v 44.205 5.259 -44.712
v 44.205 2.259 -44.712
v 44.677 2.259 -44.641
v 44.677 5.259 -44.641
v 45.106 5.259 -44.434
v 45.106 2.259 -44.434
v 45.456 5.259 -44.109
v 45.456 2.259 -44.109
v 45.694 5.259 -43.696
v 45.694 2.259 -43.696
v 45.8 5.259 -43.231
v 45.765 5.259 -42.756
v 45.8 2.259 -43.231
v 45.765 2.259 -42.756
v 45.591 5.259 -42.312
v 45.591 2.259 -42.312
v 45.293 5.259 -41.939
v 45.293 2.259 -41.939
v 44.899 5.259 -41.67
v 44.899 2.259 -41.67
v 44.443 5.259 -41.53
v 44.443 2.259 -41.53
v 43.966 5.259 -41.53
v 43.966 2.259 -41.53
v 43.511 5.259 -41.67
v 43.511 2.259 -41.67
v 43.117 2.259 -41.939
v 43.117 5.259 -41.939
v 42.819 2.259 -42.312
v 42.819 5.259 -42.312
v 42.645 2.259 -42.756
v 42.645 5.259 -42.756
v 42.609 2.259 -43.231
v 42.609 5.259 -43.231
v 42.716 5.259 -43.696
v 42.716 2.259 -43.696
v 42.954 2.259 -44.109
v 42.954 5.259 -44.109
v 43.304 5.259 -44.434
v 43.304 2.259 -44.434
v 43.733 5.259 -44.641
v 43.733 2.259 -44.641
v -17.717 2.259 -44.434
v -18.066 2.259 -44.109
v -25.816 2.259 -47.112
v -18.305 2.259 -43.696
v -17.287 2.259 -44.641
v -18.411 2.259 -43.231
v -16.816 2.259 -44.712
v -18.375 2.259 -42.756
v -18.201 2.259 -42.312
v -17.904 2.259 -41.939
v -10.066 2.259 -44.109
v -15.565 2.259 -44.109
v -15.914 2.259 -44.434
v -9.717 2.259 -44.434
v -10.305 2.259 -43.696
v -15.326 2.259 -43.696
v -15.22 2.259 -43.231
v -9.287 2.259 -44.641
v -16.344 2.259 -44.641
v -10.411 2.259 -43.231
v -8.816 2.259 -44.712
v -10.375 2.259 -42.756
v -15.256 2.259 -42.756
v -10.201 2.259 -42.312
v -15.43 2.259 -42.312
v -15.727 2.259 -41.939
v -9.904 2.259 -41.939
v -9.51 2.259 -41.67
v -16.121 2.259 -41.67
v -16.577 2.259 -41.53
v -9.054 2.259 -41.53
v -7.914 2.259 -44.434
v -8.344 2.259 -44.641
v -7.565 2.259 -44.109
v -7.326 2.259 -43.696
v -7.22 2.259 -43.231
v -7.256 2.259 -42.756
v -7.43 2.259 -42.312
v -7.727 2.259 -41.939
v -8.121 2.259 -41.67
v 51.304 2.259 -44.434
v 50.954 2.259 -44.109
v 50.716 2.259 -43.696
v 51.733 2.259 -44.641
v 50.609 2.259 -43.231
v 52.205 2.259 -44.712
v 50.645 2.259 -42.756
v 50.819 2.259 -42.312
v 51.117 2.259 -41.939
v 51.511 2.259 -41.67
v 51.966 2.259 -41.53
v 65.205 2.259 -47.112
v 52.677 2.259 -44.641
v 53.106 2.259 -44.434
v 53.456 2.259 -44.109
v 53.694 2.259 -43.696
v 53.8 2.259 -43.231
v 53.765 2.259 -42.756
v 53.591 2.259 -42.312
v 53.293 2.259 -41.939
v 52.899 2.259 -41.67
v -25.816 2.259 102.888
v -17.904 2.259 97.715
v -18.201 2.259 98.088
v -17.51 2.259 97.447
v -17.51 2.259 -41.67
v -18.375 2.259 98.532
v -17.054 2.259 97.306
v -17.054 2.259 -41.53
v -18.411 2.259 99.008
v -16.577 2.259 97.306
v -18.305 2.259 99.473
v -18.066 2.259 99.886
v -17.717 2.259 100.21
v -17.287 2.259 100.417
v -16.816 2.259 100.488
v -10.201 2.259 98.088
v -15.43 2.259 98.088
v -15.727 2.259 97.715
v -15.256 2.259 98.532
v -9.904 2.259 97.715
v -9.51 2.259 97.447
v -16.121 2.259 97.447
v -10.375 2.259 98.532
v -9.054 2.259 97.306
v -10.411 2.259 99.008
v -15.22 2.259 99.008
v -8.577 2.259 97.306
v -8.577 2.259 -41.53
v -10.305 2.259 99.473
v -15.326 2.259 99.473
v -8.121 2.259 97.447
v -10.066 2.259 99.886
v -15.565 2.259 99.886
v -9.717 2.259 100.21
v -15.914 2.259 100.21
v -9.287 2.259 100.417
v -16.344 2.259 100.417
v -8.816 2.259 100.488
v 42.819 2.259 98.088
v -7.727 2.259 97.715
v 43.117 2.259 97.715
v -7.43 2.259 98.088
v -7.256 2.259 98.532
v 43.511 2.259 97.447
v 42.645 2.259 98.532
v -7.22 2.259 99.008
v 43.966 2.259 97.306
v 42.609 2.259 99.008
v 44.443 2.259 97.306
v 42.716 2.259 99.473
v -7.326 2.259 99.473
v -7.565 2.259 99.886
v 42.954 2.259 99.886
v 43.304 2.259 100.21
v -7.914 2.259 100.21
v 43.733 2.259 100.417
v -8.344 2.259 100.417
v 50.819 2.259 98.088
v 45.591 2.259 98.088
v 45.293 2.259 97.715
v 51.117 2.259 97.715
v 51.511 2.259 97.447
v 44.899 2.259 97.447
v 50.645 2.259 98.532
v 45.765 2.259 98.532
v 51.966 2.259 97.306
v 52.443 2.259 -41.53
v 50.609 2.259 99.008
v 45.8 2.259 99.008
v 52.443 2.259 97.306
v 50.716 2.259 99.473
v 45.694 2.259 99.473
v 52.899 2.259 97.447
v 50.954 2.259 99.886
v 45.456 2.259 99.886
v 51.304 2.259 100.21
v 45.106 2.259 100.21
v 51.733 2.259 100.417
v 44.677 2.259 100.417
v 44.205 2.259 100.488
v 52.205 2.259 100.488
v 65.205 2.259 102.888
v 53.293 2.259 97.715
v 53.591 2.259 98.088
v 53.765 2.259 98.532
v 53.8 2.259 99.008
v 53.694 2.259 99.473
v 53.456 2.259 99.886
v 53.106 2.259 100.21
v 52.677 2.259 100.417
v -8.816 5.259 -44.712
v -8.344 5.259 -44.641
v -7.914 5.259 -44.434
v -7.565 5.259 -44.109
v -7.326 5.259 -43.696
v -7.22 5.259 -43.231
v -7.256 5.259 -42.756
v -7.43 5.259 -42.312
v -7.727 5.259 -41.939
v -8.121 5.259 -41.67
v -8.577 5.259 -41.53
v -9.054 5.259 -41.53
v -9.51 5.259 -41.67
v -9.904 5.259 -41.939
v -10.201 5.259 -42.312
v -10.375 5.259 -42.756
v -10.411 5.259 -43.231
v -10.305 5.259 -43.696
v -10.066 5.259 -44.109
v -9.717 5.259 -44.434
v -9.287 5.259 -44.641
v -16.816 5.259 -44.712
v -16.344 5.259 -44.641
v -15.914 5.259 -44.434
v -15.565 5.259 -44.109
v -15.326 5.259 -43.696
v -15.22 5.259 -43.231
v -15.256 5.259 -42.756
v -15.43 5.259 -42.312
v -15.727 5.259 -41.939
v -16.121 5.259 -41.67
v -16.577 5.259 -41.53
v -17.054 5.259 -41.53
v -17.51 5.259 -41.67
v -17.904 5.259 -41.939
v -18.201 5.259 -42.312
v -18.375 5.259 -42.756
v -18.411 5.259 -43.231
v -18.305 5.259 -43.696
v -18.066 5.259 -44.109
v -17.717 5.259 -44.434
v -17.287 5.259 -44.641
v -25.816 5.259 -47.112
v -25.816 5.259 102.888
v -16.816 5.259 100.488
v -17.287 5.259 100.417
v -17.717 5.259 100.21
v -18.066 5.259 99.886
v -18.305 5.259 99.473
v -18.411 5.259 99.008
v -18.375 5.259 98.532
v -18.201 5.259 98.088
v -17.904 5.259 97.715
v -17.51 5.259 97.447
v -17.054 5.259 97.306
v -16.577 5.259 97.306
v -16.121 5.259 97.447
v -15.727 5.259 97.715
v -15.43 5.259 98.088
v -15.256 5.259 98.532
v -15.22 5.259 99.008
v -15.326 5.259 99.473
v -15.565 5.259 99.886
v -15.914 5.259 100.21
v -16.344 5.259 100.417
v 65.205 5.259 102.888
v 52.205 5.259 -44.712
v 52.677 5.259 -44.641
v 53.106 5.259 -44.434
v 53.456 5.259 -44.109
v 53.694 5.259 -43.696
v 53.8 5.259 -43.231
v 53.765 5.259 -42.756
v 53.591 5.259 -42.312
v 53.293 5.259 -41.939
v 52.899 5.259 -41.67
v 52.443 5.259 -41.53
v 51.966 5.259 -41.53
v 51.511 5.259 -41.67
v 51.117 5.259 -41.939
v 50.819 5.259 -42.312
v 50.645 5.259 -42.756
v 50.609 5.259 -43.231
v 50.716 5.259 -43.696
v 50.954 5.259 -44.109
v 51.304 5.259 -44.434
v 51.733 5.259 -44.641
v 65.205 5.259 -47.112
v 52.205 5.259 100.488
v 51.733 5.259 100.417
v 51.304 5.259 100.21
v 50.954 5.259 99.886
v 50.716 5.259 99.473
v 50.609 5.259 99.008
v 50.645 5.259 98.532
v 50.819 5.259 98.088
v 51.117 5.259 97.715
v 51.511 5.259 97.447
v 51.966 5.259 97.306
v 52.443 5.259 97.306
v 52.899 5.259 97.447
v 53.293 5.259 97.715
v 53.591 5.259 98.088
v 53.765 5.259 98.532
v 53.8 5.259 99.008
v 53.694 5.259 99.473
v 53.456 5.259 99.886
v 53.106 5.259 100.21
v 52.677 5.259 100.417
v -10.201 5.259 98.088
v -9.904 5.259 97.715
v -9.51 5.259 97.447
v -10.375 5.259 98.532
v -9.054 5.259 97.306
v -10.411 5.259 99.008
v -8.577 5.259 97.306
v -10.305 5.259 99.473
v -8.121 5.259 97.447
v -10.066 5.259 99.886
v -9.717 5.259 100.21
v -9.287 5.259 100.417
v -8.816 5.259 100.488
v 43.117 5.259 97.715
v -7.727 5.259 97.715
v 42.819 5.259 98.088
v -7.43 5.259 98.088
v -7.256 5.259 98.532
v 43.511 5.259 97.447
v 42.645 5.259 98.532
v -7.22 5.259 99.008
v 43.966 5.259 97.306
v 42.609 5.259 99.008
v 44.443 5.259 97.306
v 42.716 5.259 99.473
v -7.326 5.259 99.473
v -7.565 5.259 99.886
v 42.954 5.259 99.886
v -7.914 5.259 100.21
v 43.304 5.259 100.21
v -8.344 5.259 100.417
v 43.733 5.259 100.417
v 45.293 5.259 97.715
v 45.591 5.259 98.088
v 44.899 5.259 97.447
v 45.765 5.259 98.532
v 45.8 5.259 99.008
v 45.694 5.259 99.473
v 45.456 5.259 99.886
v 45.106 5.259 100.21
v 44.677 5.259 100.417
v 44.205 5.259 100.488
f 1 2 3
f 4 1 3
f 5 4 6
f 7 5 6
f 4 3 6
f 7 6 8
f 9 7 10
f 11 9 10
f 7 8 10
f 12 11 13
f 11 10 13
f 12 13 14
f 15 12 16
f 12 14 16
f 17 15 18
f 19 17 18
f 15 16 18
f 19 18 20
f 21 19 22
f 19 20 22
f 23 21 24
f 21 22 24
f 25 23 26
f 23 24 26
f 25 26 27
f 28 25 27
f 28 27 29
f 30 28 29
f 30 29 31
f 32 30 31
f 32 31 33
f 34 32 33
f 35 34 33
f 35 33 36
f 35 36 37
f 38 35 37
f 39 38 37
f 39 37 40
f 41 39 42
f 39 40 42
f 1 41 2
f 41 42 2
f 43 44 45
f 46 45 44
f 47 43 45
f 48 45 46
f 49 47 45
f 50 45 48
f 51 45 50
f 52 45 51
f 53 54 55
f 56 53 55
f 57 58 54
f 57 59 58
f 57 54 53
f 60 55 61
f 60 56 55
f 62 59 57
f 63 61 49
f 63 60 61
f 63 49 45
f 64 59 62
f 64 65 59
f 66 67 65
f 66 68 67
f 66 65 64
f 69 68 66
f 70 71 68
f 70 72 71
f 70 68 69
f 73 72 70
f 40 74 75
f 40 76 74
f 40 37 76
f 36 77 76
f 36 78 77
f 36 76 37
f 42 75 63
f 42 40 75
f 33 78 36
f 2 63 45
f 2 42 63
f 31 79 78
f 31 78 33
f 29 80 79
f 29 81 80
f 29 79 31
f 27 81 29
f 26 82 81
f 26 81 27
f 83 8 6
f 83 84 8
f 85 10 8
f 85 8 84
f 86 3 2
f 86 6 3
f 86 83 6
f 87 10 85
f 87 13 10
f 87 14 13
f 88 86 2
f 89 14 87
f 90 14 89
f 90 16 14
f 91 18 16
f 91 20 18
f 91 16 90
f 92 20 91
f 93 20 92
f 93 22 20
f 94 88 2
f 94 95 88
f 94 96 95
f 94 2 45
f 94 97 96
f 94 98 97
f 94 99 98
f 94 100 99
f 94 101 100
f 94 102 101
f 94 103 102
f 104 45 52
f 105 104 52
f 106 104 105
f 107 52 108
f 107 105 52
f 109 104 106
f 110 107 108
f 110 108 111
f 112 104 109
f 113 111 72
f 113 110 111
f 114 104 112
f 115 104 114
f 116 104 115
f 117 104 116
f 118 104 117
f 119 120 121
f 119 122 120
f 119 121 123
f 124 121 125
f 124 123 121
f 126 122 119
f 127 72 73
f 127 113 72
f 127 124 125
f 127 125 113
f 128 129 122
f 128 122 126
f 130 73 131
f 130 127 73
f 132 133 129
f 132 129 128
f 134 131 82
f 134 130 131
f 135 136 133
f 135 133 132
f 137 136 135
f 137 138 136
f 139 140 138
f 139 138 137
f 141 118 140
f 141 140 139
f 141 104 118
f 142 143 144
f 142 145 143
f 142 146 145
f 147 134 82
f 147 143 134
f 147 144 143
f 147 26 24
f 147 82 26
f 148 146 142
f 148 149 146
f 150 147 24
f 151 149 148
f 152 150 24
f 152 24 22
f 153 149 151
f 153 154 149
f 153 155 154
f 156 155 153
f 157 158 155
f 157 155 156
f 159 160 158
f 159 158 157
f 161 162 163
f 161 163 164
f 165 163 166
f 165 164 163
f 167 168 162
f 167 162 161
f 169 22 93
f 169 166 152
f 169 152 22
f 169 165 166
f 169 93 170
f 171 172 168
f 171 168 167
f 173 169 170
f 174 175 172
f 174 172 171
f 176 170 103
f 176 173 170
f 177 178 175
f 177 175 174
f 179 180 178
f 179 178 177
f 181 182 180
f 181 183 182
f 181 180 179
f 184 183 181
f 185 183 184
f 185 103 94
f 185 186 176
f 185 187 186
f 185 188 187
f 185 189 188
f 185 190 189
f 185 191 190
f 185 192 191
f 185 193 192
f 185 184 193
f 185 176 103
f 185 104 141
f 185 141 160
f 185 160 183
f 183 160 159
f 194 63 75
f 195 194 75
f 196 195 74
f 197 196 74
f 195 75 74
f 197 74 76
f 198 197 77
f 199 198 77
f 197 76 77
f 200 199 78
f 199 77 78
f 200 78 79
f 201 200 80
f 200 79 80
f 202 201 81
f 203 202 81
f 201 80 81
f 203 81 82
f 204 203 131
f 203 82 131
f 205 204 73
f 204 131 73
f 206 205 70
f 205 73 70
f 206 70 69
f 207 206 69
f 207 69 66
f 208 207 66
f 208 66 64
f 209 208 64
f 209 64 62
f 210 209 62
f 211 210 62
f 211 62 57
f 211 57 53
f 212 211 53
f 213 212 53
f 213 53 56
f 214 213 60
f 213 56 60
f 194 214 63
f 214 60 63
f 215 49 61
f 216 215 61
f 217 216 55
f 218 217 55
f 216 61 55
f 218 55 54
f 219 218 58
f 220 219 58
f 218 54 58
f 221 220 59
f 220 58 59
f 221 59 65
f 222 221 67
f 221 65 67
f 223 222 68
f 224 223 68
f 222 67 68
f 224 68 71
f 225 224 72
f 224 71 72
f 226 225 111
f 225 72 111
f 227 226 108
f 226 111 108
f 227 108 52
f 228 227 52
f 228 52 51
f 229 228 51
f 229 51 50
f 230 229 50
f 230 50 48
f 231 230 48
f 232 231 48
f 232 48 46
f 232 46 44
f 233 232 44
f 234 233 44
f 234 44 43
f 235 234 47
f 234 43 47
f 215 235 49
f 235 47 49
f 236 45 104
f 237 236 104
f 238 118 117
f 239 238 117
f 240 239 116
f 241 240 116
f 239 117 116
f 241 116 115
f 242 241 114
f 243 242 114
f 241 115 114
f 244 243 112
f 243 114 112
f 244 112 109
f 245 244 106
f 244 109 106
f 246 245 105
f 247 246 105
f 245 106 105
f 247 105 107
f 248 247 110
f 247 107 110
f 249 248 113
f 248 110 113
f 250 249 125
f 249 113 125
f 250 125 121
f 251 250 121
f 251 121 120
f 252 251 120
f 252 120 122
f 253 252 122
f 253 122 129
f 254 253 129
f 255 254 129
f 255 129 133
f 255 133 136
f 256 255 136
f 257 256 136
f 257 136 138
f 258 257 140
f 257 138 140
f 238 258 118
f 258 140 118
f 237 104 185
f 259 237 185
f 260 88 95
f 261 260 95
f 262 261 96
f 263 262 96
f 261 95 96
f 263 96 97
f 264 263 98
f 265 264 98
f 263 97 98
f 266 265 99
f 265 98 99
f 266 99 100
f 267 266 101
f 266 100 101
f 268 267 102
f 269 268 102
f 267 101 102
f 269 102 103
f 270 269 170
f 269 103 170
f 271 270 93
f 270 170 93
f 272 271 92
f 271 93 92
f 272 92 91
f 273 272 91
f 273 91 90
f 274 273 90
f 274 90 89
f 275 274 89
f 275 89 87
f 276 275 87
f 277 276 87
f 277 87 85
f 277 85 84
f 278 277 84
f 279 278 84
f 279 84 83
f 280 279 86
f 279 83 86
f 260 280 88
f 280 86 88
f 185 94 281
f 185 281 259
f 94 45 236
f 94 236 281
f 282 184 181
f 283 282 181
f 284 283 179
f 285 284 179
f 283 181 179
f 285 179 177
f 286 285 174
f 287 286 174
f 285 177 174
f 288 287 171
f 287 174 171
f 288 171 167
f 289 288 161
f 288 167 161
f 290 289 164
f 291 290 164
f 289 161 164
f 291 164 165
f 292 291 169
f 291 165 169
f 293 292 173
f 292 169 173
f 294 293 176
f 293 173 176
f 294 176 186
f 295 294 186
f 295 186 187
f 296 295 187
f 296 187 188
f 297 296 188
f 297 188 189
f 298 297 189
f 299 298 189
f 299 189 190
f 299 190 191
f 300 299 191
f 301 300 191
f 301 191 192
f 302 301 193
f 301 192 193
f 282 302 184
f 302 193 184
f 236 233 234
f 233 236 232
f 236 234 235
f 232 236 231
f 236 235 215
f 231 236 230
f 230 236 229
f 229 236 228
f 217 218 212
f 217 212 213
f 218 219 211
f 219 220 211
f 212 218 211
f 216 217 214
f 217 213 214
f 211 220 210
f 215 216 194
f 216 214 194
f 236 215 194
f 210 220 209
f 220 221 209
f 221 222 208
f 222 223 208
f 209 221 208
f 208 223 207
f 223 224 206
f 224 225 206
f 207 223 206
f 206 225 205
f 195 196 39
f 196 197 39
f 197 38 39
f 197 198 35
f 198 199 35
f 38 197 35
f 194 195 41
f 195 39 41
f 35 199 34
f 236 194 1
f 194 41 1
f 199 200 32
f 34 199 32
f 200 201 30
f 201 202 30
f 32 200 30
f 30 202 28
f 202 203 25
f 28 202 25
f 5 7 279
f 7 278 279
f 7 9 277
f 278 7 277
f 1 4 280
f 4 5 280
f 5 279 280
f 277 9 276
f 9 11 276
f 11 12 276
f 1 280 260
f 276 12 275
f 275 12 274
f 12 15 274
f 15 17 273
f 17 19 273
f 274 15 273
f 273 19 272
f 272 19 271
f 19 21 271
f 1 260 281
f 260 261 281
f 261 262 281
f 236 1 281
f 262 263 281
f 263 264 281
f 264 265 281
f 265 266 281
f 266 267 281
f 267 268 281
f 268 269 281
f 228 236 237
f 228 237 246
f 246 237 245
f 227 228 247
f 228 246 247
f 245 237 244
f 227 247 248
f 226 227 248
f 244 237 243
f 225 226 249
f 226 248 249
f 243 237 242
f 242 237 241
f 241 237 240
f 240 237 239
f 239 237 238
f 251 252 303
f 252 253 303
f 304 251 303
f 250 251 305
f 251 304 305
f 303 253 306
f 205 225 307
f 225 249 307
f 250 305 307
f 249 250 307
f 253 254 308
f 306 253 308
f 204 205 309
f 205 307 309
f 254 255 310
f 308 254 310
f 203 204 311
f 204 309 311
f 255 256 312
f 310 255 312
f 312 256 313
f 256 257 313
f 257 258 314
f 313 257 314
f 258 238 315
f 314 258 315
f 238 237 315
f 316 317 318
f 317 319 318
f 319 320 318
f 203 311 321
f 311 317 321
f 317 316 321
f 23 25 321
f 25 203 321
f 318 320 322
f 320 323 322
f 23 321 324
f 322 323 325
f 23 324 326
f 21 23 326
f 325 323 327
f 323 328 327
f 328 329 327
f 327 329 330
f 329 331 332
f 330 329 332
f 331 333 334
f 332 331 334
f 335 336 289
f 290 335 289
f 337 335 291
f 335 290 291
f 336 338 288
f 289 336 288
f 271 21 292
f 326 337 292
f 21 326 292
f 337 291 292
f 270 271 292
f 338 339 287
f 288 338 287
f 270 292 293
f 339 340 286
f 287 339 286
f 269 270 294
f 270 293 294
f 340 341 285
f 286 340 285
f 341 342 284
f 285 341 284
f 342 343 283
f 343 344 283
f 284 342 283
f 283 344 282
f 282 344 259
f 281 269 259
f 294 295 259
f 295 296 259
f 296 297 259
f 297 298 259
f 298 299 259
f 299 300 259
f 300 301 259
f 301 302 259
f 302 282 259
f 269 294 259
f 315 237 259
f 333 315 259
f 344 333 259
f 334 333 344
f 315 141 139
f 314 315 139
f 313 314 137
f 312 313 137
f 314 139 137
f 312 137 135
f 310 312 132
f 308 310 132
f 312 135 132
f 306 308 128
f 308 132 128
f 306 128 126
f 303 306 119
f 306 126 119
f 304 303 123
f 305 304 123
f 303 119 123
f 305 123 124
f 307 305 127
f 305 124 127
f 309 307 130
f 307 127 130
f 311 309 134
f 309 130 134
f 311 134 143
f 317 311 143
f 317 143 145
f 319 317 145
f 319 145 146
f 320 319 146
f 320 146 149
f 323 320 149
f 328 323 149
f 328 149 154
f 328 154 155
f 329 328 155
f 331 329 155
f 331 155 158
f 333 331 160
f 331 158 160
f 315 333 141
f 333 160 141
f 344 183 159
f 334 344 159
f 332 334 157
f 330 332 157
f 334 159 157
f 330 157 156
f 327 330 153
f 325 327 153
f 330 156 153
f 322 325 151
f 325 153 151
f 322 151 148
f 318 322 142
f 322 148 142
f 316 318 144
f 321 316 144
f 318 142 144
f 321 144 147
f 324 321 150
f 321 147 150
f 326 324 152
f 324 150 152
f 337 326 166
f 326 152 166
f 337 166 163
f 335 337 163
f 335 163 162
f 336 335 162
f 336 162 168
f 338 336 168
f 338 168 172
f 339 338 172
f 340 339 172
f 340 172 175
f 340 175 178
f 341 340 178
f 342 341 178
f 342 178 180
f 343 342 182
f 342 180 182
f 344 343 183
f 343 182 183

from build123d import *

# Parameters (mm, degrees)
SKETCH_1_W      = 91.020470937
SKETCH_1_H      = 150
SKETCH_1_R      = 1.6
EXTRUDE_1_DEPTH = 3


with BuildPart() as part:
    # 草图1 → 凸台-拉伸1 (new body)
    with BuildSketch(Plane.XZ.offset(-2.259155248)):
        with Locations((19.694725206, 27.888283405)):
            Rectangle(SKETCH_1_W, SKETCH_1_H)
        with Locations(Location((44.204960674, -43.111716595, 0), (0, 0, 270))):
            Circle(SKETCH_1_R, mode=Mode.SUBTRACT)
        with Locations(Location((52.204960674, -43.111716595, 0), (0, 0, 270))):
            Circle(SKETCH_1_R, mode=Mode.SUBTRACT)
        with Locations(Location((52.204960674, 98.888283405, 0), (0, 0, 90))):
            Circle(SKETCH_1_R, mode=Mode.SUBTRACT)
        with Locations(Location((44.204960674, 98.888283405, 0), (0, 0, 90))):
            Circle(SKETCH_1_R, mode=Mode.SUBTRACT)
        with Locations(Location((-16.815510263, -43.111716595, 0), (0, 0, 270))):
            Circle(SKETCH_1_R, mode=Mode.SUBTRACT)
        with Locations(Location((-8.815510263, -43.111716595, 0), (0, 0, 270))):
            Circle(SKETCH_1_R, mode=Mode.SUBTRACT)
        with Locations(Location((-8.815510263, 98.888283405, 0), (0, 0, 90))):
            Circle(SKETCH_1_R, mode=Mode.SUBTRACT)
        with Locations(Location((-16.815510263, 98.888283405, 0), (0, 0, 90))):
            Circle(SKETCH_1_R, mode=Mode.SUBTRACT)
    extrude(amount=-EXTRUDE_1_DEPTH)


solid = part.part
